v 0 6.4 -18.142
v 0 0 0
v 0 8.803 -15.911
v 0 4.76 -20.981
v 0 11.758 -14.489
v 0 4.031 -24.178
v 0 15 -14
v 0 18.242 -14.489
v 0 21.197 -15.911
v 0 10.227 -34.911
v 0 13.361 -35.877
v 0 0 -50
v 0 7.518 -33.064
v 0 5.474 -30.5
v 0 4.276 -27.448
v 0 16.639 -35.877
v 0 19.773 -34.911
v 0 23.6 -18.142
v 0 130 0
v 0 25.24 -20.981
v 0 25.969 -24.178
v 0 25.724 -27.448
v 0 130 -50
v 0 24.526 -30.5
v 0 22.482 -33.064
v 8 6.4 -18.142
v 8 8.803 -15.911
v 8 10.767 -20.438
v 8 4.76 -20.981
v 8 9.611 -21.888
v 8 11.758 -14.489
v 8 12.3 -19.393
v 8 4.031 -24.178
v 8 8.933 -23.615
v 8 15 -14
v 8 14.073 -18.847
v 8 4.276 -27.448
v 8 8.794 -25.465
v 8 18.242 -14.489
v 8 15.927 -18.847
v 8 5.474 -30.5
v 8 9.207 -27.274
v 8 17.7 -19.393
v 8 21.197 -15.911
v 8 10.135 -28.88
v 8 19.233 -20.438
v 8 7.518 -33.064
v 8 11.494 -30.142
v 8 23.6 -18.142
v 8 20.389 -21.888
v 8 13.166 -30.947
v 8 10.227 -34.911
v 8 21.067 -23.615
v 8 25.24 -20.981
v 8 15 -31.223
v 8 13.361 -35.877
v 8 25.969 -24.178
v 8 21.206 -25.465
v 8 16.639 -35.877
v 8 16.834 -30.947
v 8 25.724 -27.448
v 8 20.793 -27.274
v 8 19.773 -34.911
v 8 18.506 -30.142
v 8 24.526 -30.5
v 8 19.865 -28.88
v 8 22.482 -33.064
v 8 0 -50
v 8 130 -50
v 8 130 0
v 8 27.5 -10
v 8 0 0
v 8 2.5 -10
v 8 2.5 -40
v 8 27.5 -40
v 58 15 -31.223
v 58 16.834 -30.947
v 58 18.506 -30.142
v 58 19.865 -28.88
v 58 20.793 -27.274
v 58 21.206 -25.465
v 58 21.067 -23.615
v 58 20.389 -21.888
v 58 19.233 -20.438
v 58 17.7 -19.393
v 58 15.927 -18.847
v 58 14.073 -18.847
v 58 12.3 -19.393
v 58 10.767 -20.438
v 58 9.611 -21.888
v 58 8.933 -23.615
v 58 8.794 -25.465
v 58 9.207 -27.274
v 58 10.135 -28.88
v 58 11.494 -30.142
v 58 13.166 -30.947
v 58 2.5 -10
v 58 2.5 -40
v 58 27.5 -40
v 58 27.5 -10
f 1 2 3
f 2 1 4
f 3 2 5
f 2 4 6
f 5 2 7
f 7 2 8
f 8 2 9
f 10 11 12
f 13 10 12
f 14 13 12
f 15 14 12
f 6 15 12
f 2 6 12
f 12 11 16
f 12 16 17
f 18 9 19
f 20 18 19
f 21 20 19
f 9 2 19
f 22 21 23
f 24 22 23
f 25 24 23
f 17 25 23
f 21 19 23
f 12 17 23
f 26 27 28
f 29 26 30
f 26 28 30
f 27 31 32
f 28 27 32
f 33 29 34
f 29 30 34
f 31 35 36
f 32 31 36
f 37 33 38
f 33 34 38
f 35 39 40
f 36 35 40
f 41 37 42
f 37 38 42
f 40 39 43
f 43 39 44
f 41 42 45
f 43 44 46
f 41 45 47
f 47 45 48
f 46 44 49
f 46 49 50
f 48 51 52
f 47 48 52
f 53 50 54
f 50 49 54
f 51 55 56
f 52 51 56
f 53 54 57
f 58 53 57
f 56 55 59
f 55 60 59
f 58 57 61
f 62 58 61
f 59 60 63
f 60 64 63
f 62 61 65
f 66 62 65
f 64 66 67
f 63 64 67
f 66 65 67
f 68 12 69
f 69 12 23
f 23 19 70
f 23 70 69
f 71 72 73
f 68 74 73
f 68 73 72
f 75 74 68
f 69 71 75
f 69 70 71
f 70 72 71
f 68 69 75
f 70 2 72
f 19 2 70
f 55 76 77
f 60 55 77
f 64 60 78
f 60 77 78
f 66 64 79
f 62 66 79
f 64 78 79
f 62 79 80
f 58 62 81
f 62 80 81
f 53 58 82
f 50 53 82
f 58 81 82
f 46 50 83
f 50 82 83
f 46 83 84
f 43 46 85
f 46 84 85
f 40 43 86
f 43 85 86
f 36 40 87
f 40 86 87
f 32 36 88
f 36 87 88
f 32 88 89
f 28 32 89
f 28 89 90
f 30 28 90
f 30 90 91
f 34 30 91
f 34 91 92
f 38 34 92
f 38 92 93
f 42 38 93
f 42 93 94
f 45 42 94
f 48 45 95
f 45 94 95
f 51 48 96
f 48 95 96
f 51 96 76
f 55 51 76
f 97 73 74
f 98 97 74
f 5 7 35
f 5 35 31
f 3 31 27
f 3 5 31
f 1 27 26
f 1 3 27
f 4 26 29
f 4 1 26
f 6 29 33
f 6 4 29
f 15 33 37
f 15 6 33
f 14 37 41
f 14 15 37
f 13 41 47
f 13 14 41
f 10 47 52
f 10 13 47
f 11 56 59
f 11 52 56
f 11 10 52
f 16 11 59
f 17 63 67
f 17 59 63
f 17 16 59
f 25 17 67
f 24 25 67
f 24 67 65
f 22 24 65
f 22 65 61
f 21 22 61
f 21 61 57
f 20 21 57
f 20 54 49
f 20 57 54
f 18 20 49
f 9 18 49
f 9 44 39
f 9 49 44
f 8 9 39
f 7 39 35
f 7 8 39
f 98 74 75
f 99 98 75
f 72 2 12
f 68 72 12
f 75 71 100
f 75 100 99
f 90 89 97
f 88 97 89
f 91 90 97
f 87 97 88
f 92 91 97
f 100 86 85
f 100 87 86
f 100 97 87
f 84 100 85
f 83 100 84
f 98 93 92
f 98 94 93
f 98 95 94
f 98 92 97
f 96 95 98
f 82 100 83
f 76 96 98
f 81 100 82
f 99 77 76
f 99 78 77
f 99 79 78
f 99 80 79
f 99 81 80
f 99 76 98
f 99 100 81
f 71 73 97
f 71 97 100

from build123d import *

# Parameters (mm, degrees)
SKETCH2_W               = 50
SKETCH2_H               = 130
BOSS_EXTRUDE2_DEPTH     = 8
CUT_EXTRUDE1_DEPTH      = 20
CUT_EXTRUDE1_DEPTH_BACK = 20
SKETCH4_R               = 11
SKETCH7_W               = 30
SKETCH7_H               = 25
BOSS_EXTRUDE3_DEPTH     = 50
SKETCH8_R               = 6.223
CUT_EXTRUDE2_DEPTH      = 50


with BuildPart() as part:
    # Sketch2 → Boss-Extrude2 (new body)
    with BuildSketch(Plane(origin=(0, 0, 0), x_dir=(0, 0, -1), z_dir=(1, 0, 0))):
        with Locations((25, 65)):
            Rectangle(SKETCH2_W, SKETCH2_H)
    extrude(amount=BOSS_EXTRUDE2_DEPTH)

    # Sketch4 → Cut-Extrude1 (cut, two sides: drawn at the far end of the back side and taken through both)
    with BuildSketch(Plane(origin=(0, 0, 0), x_dir=(0, 0, -1), z_dir=(1, 0, 0)).offset(-CUT_EXTRUDE1_DEPTH_BACK)):
        with Locations(Location((25, 15, 0), (0, 0, 180))):
            Circle(SKETCH4_R)
    extrude(amount=CUT_EXTRUDE1_DEPTH + CUT_EXTRUDE1_DEPTH_BACK, mode=Mode.SUBTRACT)

    # Sketch7 → Boss-Extrude3 (add)
    with BuildSketch(Plane(origin=(8, 0, 0), x_dir=(0, 0, -1), z_dir=(1, 0, 0))):
        with Locations((25, 15)):
            Rectangle(SKETCH7_W, SKETCH7_H)
    extrude(amount=BOSS_EXTRUDE3_DEPTH)

    # Sketch8 → Cut-Extrude2 (cut)
    with BuildSketch(Plane(origin=(58, 0, 0), x_dir=(0, 0, -1), z_dir=(1, 0, 0))):
        with Locations((25, 15)):
            Circle(SKETCH8_R)
    extrude(amount=-CUT_EXTRUDE2_DEPTH, mode=Mode.SUBTRACT)


solid = part.part
